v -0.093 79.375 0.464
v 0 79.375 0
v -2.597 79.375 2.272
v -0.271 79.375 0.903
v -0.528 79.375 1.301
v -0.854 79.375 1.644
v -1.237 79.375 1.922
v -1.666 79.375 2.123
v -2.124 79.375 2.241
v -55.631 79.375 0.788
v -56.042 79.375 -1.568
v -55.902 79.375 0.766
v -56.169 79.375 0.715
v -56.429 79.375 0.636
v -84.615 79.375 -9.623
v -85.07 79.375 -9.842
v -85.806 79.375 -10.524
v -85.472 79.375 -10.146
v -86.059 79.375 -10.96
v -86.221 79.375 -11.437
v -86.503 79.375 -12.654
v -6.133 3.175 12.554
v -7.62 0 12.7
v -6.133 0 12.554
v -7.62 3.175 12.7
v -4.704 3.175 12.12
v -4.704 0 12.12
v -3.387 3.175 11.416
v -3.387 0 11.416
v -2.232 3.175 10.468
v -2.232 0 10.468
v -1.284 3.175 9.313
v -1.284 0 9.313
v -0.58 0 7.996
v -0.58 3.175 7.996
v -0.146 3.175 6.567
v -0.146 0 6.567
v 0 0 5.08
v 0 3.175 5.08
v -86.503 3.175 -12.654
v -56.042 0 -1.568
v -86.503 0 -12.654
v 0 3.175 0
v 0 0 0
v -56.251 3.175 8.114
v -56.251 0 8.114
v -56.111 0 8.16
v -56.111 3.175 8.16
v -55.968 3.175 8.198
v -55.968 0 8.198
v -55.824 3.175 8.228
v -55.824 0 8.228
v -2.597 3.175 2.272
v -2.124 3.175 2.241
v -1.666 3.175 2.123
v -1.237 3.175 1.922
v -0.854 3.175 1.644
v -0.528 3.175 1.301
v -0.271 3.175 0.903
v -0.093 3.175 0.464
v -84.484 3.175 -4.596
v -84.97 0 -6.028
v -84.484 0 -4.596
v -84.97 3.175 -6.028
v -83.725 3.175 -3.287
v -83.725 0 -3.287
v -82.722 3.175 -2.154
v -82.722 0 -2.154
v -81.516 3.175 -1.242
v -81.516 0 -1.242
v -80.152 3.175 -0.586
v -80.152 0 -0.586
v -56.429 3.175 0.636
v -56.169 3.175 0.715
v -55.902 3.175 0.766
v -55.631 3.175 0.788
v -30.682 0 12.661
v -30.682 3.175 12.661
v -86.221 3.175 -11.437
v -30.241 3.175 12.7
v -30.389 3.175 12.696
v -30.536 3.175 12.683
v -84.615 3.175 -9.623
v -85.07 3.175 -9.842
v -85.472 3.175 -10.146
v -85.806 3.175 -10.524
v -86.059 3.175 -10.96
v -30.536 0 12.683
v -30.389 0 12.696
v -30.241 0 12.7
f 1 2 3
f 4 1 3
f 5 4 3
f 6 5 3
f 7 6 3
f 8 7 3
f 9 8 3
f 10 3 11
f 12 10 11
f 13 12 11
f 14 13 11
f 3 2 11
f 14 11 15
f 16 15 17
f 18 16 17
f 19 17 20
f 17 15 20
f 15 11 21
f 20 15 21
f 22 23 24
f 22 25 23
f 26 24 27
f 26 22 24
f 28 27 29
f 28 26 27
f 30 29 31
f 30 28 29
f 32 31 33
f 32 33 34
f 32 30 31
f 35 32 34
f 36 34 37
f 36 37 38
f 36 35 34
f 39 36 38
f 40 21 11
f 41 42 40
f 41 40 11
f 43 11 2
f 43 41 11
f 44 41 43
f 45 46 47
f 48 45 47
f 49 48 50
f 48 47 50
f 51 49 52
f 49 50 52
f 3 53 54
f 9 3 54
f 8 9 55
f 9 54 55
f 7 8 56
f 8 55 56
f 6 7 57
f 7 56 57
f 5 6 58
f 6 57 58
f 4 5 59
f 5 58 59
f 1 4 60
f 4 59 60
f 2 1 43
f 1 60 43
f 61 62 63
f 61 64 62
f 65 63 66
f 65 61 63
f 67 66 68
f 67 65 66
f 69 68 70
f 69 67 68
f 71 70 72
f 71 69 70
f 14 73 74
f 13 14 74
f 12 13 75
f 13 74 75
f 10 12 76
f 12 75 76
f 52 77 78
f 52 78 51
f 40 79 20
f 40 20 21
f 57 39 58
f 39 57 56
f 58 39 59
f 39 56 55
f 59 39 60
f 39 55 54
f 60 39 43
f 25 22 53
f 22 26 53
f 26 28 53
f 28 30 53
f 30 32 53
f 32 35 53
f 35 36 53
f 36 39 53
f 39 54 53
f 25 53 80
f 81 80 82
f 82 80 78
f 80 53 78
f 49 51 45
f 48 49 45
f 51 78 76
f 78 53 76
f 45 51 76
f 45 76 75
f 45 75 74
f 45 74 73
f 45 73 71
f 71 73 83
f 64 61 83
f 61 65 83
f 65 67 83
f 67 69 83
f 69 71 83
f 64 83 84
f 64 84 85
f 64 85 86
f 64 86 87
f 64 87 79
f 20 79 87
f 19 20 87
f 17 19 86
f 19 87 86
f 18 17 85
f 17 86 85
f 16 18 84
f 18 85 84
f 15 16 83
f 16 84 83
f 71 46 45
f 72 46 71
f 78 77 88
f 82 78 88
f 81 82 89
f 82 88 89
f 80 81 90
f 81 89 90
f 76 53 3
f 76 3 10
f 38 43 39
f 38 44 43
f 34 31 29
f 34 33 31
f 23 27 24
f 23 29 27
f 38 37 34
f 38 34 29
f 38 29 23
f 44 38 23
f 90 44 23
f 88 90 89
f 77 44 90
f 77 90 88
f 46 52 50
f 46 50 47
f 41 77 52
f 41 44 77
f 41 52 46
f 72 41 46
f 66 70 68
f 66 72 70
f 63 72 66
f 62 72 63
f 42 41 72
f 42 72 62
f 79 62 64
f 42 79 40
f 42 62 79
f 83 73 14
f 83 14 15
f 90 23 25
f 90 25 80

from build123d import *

# Parameters (mm, degrees)
GAGE_PLATE_SIDE_EXTRUDE_DEPTH = 3.175
BOSS_EXTRUDE2_DEPTH           = 76.2
FILLET1_R                     = 2.54
FILLET2_R                     = 7.62


with BuildPart() as part:
    # Sketch1 → Gage Plate-side Extrude (new body)
    with BuildSketch(Plane(origin=(0, 0, 0), x_dir=(1, 0, 0), z_dir=(0, 1, 0))):
        Polygon((0, 0), (0, -12.7), (-30.463396962, -12.7), (-56.042370913, -8.189736754), (-84.03796246, 1.99982526), (-86.502886868, 12.65434565), (-56.042370913, 1.567624522), align=None)
    extrude(amount=GAGE_PLATE_SIDE_EXTRUDE_DEPTH)

    # Sketch2 → Boss-Extrude2 (add)
    with BuildSketch(Plane(origin=(0, 3.175, 0), x_dir=(1, 0, 0), z_dir=(0, 1, 0))):
        Polygon((0, 0), (0, -2.344295335), (-56.042370913, -0.776670813), (-85.910666223, 10.094499628), (-86.502886868, 12.65434565), (-56.042370913, 1.567624522), align=None)
    extrude(amount=BOSS_EXTRUDE2_DEPTH)

    # Fillet1
    # the kernel refuses this fillet: 2.54 mm, written as the material it takes off along each edge
    with BuildSketch(Plane(origin=(-30.463396962, -0.555553013, 12.7), x_dir=(-0.9848077530122088, 0, -0.17364817766692622), z_dir=(0, 1, 0)), Plane(origin=(-56.042370913, -0.555553013, 8.189736754), x_dir=(-0.9396926207859081, 0, -0.3420201433256695), z_dir=(0, 1, 0))) as fillet1_piece_1:
        with BuildLine():
            CenterArc((FILLET1_R * 0.0874886635259, -FILLET1_R), FILLET1_R, 90, 10)
            Line((-FILLET1_R * 0.086159514141, -FILLET1_R * 0.0151922469878), (0, 0))
            Line((0, 0), (FILLET1_R * 0.0874886635259, 0))
        make_face()
    extrude(amount=4.286106027, mode=Mode.SUBTRACT)
    with BuildSketch(Plane(origin=(-56.042370913, 3.175, 0.776670813), x_dir=(-0.9396926207859059, 0, -0.3420201433256751), z_dir=(0, 1, 0))) as fillet1_piece_2:
        with BuildLine():
            CenterArc((FILLET1_R * 0.161944353893, -FILLET1_R), FILLET1_R, 90, 18.397732774)
            Line((-FILLET1_R * 0.153667135261, -FILLET1_R * 0.0511114986921), (0, 0))
            Line((0, 0), (FILLET1_R * 0.161944353893, 0))
        make_face()
    extrude(amount=77.228346647, mode=Mode.SUBTRACT)
    with BuildSketch(Plane(origin=(0, 3.175, 2.344295335), x_dir=(0, 0, -1), z_dir=(0, 1, 0))) as fillet1_piece_3:
        with BuildLine():
            CenterArc((2.611648042, 2.525890443), FILLET1_R, 178.397732774, 85.560295248)
            Line((0.072641158, 2.596911875), (0, 0))
            Line((0, 0), (2.344295335, 0))
        make_face()
    extrude(amount=82.694819102, mode=Mode.SUBTRACT)
    with BuildSketch(Plane(origin=(-85.910666223, 3.175, -10.094499628), x_dir=(-0.22539678463569066, 0, -0.9742670524429594), z_dir=(0, 1, 0))) as fillet1_piece_4:
        with BuildLine():
            CenterArc((FILLET1_R * 0.542659564301, -FILLET1_R), FILLET1_R, 90, 56.973788384)
            Line((-FILLET1_R * 0.295761754969, -FILLET1_R * 0.454977347815), (0, 0))
            Line((0, 0), (FILLET1_R * 0.542659564301, 0))
        make_face()
    extrude(amount=79.645888233, mode=Mode.SUBTRACT)

    # Fillet2
    fillet2_edges = [part.edges().sort_by_distance(p)[0] for p in [
        (0, 1.5875, 12.7),
        (-84.03796246, 1.5875, -1.99982526),
    ]]
    fillet(fillet2_edges, radius=FILLET2_R)


solid = part.part
